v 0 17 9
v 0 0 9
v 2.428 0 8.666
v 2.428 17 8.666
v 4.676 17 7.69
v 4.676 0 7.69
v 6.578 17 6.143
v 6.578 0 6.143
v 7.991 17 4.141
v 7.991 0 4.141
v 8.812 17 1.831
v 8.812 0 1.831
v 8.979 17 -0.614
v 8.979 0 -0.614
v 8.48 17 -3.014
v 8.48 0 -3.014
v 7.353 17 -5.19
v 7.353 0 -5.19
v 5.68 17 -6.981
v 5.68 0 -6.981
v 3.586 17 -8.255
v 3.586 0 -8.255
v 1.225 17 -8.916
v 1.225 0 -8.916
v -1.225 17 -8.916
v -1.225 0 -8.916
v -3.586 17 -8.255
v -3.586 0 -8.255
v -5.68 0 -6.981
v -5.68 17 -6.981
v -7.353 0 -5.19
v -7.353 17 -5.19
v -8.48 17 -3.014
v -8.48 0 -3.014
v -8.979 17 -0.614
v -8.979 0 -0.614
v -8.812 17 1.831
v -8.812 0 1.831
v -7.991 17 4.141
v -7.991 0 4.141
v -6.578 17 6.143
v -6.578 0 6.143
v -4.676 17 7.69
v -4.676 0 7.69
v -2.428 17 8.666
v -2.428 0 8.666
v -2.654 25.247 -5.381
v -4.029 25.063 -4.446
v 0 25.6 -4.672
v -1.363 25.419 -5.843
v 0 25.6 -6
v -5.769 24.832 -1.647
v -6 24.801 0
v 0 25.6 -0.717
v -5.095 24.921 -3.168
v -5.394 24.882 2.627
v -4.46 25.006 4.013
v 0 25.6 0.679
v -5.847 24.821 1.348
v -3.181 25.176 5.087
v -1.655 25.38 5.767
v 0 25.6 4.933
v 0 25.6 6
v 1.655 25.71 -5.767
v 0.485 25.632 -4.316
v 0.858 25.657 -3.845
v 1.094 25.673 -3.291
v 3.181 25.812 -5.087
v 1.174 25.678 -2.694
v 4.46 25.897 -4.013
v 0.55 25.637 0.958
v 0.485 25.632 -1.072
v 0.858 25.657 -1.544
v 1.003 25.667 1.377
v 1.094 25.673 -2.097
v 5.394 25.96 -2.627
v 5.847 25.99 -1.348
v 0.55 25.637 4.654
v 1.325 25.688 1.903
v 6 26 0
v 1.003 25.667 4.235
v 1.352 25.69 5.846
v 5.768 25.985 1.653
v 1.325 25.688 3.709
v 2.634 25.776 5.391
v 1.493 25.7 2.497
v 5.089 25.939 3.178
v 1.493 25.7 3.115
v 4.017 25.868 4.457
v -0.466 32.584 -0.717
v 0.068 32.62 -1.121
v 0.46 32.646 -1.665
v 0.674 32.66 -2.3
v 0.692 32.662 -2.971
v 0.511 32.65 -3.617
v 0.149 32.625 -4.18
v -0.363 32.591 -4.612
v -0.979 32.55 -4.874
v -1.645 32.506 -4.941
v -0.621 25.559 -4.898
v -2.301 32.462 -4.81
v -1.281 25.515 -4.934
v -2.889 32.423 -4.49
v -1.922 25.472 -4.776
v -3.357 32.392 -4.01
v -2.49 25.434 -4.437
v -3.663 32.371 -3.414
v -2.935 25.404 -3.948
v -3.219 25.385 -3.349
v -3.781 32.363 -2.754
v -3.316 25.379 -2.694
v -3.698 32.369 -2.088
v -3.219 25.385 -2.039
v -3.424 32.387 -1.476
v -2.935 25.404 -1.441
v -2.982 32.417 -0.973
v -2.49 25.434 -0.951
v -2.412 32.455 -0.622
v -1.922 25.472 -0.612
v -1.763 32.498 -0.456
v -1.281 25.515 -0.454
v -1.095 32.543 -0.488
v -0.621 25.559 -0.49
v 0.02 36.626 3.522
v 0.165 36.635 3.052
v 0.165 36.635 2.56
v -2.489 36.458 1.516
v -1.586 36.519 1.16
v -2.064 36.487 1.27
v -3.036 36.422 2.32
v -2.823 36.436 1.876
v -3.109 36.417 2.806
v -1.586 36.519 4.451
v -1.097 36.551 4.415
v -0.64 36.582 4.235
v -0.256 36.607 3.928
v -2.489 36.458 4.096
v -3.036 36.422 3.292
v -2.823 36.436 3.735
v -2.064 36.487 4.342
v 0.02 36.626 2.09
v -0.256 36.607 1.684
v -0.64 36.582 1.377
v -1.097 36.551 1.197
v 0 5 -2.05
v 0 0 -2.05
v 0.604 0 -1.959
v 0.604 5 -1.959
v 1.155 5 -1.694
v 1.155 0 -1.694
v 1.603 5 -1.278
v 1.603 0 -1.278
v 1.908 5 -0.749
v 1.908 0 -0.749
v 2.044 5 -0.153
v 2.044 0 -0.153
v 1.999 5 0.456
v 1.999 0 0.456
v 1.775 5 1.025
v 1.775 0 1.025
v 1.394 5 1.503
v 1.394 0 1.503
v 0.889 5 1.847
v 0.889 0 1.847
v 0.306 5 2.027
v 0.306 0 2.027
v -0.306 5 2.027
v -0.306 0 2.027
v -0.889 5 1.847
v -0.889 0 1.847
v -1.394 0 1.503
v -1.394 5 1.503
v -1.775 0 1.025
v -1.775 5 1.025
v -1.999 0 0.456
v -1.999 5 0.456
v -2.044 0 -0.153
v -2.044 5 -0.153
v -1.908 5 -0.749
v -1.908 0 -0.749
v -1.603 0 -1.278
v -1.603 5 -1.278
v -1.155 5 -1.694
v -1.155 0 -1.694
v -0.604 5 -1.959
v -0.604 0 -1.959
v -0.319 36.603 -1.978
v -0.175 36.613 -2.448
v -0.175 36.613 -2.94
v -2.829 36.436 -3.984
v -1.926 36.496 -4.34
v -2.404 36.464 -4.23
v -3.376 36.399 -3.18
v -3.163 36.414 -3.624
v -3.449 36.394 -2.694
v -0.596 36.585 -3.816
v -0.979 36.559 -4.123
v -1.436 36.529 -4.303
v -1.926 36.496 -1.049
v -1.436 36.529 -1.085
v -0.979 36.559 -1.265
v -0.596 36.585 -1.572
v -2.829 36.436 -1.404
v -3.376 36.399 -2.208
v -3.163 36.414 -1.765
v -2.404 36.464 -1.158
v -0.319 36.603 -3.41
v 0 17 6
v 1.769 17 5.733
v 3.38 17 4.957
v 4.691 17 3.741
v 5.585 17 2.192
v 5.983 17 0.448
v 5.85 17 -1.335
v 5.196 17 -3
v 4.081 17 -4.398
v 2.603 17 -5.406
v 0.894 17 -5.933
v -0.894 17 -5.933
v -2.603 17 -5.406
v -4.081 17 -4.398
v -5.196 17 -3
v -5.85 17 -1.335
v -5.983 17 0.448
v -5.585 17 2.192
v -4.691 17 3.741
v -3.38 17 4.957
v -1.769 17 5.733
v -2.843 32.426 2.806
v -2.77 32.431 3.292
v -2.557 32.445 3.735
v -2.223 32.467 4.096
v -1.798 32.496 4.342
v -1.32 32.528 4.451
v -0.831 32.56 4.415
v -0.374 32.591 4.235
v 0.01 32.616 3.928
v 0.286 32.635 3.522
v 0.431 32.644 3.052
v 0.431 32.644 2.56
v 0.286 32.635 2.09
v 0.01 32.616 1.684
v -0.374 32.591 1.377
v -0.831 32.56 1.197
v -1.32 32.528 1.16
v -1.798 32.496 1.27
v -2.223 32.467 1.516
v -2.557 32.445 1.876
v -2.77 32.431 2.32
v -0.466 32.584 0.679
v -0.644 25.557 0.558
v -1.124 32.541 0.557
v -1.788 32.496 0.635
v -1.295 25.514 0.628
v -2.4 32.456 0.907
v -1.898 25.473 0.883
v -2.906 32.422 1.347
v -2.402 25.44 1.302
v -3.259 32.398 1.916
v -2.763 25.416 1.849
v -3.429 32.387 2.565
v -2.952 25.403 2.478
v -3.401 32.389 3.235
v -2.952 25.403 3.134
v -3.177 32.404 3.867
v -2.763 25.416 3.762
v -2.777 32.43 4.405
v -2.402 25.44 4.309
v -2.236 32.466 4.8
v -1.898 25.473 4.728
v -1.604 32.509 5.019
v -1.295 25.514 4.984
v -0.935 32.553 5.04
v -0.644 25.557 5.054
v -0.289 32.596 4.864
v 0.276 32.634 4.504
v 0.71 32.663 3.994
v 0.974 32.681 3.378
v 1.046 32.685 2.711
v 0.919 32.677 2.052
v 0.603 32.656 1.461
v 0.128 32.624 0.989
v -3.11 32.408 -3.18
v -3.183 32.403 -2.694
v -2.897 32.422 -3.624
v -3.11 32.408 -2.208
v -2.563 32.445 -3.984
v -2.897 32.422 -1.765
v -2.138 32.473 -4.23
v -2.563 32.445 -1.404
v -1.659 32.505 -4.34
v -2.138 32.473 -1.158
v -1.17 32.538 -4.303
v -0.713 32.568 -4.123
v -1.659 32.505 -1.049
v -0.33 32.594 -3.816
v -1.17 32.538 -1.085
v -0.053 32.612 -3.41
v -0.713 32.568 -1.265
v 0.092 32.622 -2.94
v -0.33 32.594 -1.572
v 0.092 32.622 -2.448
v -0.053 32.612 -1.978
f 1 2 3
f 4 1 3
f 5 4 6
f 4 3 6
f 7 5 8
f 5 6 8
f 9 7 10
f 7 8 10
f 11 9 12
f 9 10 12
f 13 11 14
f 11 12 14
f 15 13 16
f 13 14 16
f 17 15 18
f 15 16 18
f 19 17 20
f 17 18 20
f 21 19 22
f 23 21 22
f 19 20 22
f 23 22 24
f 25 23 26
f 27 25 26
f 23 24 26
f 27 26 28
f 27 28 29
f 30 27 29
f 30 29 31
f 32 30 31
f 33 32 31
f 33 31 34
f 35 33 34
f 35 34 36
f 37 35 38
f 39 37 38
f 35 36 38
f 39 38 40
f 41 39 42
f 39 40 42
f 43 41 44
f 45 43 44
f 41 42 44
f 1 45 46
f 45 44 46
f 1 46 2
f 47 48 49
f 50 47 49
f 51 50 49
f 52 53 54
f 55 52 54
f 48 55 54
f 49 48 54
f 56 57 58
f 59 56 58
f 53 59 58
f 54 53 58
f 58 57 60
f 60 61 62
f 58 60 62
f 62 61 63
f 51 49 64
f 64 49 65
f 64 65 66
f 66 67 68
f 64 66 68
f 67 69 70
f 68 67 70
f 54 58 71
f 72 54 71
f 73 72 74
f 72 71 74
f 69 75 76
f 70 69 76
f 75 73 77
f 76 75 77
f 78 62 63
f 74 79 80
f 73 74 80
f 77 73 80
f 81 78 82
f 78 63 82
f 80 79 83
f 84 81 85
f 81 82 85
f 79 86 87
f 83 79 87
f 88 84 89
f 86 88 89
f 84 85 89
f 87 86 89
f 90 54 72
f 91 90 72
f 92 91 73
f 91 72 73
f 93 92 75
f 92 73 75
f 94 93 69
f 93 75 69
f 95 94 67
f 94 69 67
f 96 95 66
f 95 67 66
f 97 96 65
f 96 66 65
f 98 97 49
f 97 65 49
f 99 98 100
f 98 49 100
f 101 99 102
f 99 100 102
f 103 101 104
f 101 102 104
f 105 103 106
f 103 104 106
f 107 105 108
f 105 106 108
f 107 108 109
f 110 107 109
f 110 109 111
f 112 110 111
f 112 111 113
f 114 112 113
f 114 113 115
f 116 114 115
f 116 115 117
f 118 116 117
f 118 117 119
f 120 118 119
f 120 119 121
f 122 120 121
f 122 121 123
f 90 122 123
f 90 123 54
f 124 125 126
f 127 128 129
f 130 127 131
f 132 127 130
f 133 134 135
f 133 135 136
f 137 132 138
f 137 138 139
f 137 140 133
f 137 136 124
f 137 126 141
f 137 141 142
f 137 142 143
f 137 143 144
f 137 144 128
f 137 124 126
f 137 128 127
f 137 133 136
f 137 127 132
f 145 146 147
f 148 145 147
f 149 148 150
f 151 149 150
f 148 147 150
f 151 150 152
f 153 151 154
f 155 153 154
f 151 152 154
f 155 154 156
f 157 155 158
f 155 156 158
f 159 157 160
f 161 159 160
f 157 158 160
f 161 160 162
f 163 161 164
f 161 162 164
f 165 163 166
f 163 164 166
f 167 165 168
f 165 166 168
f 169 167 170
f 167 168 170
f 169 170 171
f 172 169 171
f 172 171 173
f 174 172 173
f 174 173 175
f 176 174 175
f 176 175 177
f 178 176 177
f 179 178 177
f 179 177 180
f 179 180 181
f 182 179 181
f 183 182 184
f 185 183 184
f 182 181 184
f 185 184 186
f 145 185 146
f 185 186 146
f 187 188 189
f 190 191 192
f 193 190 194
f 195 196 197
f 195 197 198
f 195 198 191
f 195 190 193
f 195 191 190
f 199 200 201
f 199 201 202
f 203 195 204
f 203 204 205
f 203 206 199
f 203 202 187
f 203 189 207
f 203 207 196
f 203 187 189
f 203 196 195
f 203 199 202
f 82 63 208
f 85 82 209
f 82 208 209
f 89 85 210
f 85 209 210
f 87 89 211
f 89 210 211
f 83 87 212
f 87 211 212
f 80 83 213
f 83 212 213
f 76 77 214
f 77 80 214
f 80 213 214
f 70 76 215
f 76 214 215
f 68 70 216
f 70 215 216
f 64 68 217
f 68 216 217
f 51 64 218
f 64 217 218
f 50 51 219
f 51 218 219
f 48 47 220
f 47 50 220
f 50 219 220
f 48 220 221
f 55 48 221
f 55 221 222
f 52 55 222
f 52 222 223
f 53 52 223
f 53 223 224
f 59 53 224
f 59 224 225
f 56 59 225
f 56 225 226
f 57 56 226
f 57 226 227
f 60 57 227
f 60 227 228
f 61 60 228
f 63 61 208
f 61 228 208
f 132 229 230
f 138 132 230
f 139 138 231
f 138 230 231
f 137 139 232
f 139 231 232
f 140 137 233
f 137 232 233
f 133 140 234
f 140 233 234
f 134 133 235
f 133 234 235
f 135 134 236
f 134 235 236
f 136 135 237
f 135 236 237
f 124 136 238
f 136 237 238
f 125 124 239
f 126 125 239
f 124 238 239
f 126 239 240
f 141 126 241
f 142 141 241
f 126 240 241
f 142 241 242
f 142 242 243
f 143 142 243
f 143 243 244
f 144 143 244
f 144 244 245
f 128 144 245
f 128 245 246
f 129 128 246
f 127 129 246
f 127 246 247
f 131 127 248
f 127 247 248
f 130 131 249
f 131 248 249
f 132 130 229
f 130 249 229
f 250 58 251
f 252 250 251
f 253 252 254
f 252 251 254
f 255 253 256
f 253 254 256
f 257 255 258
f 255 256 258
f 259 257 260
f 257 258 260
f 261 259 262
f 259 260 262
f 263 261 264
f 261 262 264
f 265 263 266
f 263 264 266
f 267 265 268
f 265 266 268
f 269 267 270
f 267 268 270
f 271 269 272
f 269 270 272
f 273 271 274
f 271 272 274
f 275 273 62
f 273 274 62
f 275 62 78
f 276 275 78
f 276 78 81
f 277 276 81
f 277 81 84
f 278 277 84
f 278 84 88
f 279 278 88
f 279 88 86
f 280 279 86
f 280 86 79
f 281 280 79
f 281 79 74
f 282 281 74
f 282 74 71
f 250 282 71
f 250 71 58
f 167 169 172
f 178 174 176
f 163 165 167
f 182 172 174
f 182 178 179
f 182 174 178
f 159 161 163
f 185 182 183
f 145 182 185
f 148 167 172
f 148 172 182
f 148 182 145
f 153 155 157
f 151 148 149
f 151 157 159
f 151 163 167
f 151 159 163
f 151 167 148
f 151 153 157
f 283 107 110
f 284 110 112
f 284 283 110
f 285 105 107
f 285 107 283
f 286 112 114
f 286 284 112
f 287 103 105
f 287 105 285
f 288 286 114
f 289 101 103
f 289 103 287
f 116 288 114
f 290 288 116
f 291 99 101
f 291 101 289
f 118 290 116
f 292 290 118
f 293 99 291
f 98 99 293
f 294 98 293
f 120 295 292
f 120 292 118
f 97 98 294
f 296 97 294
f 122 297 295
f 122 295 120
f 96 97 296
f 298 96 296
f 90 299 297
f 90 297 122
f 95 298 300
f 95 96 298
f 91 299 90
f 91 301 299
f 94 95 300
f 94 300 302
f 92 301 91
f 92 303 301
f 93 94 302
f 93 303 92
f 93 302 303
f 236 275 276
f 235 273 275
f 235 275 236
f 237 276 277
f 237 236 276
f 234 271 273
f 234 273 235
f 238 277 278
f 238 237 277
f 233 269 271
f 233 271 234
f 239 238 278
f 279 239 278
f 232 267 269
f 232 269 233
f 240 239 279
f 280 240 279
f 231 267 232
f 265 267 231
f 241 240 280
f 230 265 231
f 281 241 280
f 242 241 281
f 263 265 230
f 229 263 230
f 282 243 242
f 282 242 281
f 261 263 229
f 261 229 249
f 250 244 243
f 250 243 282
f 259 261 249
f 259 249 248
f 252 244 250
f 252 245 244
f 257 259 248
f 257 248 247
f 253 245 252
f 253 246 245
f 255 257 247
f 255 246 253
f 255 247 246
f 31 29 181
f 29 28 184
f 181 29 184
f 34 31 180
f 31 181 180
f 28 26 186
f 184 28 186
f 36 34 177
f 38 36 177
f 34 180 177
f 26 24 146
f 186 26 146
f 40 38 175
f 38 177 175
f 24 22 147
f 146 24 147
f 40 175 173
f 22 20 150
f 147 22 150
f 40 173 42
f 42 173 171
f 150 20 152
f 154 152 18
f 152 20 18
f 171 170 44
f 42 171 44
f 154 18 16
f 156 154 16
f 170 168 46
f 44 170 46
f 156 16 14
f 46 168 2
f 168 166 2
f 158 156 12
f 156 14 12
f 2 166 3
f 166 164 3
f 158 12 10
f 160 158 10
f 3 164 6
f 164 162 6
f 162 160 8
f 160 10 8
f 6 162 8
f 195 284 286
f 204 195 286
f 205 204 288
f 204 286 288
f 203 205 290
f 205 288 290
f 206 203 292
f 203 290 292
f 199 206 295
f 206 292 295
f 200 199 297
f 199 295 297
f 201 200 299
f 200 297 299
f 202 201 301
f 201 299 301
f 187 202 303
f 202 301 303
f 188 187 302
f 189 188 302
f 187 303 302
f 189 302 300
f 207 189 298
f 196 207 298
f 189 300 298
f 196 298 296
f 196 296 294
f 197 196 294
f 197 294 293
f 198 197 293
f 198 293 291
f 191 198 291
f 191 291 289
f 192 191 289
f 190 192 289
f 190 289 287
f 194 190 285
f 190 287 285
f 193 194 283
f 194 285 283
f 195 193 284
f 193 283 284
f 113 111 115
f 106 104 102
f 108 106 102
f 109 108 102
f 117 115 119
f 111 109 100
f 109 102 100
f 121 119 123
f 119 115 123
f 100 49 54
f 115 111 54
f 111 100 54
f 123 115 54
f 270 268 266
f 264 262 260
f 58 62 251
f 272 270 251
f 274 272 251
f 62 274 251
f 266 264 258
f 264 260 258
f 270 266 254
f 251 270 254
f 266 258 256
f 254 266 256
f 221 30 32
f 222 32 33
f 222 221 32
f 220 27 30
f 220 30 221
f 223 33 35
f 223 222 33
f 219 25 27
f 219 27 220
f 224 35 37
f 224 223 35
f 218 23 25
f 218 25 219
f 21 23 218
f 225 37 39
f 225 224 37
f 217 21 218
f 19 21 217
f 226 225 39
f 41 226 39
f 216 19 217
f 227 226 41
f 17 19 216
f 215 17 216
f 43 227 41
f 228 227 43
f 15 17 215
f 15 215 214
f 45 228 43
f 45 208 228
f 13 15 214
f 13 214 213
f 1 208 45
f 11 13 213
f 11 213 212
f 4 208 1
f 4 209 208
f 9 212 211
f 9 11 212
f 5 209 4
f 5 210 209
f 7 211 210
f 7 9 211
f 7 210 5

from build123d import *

# Parameters (mm, degrees)
CROQUIS1_R              = 9
SALIENTE_EXTRUIR1_DEPTH = 17
CROQUIS2_R              = 6
SALIENTE_EXTRUIR2_DEPTH = 9
CORTAR_EXTRUIR1_DEPTH   = 9.5
CROQUIS4_R              = 2.25
SALIENTE_EXTRUIR3_DEPTH = 7
CROQUIS5_R              = 1.65
SALIENTE_EXTRUIR4_DEPTH = 4
CROQUIS6_R              = 2.05
CORTAR_EXTRUIR2_DEPTH   = 5


with BuildPart() as part:
    # Croquis1 → Saliente-Extruir1 (new body)
    with BuildSketch(Plane(origin=(0, 0, 0), x_dir=(1, 0, 0), z_dir=(0, 1, 0))):
        with Locations(Location((0, 0, 0), (0, 0, 270))):
            Circle(CROQUIS1_R)
    extrude(amount=SALIENTE_EXTRUIR1_DEPTH)

    # Croquis2 → Saliente-Extruir2 (add)
    with BuildSketch(Plane(origin=(0, 17, 0), x_dir=(1, 0, 0), z_dir=(0, 1, 0))):
        with Locations(Location((0, 0, 0), (0, 0, 270))):
            Circle(CROQUIS2_R)
    extrude(amount=SALIENTE_EXTRUIR2_DEPTH)

    # Croquis3 → Cortar-Extruir1 (cut, symmetric)
    with BuildSketch(Plane.XY):
        Polygon((-6, 24.801), (0, 25.6), (6, 26), (-6, 26), align=None)
    extrude(amount=CORTAR_EXTRUIR1_DEPTH, both=True, mode=Mode.SUBTRACT)

    # Croquis4 → Saliente-Extruir3 (add)
    with BuildSketch(Plane(origin=(-1.699115044, 25.486725664, 0), x_dir=(0.997785157856609, 0.06651901052377411, 0), z_dir=(-0.06651901052377411, 0.997785157856609, 0))):
        with Locations(Location((0.629712535, 2.694122729, 0), (0, 0, 298.487451849))):
            Circle(CROQUIS4_R)
        with Locations(Location((0.970047848, -2.805877271, 0), (0, 0, 70.99163809))):
            Circle(CROQUIS4_R)
    extrude(amount=SALIENTE_EXTRUIR3_DEPTH)

    # Croquis5 → Saliente-Extruir4 (add)
    with BuildSketch(Plane(origin=(-2.164748118, 32.471221769, 0), x_dir=(0.997785157856609, 0.06651901052377412, 0), z_dir=(-0.06651901052377412, 0.997785157856609, 0))):
        with Locations(Location((0.629712535, 2.694122729, 0), (0, 0, 180))):
            Circle(CROQUIS5_R)
        with Locations(Location((0.970047848, -2.805877271, 0), (0, 0, 180))):
            Circle(CROQUIS5_R)
    extrude(amount=SALIENTE_EXTRUIR4_DEPTH)

    # Croquis6 → Cortar-Extruir2 (cut)
    with BuildSketch(Plane.XZ):
        with Locations(Location((0, 0, 0), (0, 0, 270))):
            Circle(CROQUIS6_R)
    extrude(amount=-CORTAR_EXTRUIR2_DEPTH, mode=Mode.SUBTRACT)


solid = part.part
